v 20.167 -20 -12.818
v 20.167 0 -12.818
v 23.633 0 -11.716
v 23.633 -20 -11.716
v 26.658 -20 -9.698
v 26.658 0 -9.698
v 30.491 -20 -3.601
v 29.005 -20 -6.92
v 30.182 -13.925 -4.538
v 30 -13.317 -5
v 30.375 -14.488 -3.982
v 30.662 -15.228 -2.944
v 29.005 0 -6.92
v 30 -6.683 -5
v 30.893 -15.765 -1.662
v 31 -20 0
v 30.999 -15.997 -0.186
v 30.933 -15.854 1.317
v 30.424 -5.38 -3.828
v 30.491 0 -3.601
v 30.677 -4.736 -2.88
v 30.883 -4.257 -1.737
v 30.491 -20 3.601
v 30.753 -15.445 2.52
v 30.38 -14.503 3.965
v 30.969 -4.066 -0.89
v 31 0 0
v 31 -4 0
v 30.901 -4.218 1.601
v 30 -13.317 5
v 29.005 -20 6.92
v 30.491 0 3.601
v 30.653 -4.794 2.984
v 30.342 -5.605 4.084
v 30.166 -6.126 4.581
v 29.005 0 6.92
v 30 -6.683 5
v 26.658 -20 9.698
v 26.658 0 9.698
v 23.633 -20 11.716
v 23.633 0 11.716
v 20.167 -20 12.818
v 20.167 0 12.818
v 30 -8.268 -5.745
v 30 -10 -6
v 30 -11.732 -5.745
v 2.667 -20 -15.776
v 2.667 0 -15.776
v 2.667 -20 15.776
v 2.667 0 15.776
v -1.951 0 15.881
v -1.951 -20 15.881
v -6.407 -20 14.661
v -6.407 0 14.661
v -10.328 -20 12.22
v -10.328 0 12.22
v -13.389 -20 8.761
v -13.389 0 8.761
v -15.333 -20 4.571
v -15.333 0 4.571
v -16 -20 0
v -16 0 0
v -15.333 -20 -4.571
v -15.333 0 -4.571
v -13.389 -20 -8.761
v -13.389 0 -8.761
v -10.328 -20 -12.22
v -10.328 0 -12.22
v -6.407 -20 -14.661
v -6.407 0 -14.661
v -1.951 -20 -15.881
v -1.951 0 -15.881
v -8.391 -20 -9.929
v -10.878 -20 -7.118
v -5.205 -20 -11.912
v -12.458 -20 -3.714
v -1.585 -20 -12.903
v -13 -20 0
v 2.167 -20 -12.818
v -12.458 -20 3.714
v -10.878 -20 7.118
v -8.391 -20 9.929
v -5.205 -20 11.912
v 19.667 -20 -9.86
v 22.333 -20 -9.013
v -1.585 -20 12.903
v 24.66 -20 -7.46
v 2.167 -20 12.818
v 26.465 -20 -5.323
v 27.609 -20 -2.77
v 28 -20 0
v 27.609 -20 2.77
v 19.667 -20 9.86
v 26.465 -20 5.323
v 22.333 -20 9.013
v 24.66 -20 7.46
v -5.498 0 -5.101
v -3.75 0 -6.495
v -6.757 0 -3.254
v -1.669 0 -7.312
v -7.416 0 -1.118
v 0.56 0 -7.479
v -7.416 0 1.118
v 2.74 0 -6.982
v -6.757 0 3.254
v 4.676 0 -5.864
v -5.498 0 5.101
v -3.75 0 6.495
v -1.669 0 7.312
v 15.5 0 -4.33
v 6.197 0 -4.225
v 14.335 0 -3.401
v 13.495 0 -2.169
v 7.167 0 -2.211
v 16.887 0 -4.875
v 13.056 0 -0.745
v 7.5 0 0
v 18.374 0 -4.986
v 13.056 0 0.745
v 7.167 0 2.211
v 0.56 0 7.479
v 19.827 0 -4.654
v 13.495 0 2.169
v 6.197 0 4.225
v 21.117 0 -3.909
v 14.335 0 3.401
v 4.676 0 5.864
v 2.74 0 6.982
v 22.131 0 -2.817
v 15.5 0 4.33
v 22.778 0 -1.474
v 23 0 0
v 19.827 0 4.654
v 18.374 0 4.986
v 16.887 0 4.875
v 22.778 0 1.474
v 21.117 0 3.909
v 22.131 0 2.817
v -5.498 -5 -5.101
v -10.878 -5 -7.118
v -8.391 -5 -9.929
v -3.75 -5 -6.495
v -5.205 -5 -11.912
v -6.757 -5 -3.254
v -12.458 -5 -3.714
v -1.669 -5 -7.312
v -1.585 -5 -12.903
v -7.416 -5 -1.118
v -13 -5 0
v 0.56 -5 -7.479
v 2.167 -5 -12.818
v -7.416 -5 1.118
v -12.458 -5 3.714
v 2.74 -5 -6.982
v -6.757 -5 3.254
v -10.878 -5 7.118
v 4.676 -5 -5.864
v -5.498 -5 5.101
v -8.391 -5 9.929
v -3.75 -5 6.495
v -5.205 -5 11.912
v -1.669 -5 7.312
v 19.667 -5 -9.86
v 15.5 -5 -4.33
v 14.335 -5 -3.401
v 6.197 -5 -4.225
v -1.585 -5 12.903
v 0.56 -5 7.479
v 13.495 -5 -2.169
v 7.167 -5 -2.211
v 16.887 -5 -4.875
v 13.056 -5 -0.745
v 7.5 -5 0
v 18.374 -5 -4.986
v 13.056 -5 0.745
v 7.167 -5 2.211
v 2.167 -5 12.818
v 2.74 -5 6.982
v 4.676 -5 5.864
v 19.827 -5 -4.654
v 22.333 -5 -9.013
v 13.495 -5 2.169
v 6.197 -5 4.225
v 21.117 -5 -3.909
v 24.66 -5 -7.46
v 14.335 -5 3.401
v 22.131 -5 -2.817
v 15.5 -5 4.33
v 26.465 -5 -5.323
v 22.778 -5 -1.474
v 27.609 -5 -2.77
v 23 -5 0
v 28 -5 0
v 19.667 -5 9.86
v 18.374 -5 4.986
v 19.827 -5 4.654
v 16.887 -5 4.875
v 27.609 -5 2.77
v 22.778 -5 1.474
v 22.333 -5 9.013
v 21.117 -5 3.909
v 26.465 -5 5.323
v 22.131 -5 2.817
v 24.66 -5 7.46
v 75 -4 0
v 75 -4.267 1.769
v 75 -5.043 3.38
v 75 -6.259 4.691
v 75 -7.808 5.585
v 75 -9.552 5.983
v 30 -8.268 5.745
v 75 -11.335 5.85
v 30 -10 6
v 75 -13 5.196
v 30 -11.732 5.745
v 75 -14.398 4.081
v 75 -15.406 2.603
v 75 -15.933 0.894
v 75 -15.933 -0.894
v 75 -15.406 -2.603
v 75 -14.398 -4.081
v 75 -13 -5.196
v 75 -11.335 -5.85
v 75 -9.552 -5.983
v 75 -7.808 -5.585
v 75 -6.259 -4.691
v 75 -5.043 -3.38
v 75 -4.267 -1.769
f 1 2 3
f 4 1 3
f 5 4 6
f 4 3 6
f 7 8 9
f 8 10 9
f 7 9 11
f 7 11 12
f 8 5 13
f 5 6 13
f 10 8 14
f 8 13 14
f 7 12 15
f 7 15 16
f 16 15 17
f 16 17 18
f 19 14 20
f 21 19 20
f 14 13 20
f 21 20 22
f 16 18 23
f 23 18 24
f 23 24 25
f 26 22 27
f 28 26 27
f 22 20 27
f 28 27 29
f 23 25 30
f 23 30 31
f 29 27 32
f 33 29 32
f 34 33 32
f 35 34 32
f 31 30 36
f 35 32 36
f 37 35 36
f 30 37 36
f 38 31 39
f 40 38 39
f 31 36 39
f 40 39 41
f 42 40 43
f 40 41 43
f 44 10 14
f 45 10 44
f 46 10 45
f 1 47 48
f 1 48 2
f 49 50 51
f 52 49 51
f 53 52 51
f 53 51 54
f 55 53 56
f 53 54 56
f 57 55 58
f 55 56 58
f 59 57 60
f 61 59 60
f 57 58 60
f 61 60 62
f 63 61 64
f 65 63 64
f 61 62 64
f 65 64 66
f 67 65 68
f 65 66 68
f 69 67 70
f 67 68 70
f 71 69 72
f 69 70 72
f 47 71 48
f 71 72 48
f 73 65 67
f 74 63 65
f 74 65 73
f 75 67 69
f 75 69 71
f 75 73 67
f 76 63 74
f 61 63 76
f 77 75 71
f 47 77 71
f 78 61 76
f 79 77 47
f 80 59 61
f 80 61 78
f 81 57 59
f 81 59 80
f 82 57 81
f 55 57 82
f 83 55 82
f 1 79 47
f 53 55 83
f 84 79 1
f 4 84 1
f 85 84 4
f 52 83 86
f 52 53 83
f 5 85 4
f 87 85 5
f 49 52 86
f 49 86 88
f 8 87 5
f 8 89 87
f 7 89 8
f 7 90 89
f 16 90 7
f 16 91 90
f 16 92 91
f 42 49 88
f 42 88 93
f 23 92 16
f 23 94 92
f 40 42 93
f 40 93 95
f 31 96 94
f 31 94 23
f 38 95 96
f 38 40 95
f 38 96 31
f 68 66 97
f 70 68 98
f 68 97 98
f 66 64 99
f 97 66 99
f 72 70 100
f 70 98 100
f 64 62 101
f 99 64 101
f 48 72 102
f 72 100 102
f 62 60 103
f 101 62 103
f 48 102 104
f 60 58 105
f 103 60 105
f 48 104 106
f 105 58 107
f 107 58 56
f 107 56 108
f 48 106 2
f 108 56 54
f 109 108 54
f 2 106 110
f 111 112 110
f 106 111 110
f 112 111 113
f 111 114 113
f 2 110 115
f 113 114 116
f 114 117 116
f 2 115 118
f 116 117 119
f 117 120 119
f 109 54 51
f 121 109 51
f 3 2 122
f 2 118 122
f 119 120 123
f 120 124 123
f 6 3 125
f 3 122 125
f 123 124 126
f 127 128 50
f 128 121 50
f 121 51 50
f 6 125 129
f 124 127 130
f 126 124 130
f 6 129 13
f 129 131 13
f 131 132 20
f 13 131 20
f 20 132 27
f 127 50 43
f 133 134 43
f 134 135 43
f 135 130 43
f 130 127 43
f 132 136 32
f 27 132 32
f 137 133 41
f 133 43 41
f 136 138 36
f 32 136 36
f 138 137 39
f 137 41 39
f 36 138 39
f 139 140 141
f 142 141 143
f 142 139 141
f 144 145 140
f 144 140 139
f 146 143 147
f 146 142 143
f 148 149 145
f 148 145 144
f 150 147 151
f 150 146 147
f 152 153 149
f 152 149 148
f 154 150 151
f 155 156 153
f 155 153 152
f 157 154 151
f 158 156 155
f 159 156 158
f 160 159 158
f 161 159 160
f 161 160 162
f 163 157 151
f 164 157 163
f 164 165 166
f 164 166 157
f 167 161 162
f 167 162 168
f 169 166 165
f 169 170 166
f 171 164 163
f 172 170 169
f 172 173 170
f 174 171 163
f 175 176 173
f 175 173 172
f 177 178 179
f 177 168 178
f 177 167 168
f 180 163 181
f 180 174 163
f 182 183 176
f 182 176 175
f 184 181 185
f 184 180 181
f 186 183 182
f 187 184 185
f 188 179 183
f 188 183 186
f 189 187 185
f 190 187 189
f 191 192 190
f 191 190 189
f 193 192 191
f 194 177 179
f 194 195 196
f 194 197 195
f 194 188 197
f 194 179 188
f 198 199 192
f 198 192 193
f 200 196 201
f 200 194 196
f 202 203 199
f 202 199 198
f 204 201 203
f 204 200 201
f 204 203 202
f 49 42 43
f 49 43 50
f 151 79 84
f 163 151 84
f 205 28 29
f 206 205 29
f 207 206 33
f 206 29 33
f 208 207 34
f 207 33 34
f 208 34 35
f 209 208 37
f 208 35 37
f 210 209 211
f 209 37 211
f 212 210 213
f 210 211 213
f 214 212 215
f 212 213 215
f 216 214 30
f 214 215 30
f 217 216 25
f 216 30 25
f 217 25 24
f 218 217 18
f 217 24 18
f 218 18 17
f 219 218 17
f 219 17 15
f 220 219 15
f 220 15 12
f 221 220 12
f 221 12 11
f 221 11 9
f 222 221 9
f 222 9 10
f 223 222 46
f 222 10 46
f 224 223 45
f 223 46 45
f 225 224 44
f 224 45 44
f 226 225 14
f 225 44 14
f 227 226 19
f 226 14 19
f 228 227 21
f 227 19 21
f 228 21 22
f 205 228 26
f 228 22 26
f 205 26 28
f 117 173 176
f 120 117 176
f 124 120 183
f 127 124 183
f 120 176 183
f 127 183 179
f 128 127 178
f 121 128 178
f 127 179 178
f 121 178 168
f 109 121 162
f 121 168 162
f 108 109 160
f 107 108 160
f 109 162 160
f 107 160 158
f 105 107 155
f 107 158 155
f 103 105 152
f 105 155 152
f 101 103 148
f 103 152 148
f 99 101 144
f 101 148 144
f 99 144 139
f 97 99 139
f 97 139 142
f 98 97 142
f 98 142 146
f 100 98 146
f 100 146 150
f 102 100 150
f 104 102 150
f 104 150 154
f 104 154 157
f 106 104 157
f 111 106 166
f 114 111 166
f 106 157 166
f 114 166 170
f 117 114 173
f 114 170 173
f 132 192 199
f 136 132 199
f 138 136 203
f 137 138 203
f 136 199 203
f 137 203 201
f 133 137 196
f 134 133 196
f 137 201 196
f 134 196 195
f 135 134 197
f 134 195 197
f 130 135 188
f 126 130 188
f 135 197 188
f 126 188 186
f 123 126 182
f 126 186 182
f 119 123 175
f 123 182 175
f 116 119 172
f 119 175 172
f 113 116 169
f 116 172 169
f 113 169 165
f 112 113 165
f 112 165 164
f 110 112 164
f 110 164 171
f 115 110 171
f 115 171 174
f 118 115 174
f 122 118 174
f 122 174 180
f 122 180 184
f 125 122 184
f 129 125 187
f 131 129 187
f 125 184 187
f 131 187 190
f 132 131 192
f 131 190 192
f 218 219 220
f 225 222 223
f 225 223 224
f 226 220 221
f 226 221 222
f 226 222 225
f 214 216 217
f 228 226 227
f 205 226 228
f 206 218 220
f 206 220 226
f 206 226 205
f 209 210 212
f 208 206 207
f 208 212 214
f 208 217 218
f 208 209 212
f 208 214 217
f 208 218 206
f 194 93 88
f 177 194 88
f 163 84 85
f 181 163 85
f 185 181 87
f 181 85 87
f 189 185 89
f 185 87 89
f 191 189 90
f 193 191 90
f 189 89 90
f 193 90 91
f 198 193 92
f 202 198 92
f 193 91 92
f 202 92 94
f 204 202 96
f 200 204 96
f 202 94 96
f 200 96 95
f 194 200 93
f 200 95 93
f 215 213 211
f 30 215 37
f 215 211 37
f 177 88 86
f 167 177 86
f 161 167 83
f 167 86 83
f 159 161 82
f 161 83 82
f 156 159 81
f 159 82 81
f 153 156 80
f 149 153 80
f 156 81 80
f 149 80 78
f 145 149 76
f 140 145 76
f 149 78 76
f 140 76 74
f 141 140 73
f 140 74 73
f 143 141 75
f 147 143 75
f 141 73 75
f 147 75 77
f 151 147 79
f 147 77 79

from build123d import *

# Parameters (mm, degrees)
F1_DEPTH = 20
F3_DEPTH = 15
F4_R     = 5
F4_R_2   = 7.5
F5_DEPTH = 5
F7_R     = 6
F8_DEPTH = 45


with BuildPart() as f1:
    # F0 (on Front) → F1 (new body)
    with BuildSketch(Plane.XZ):
        with BuildLine():
            ThreePointArc((2.666667, 15.776213), (-16, 0), (2.666667, -15.776213))
            Line((2.666667, -15.776213), (20.166667, -12.818173))
            ThreePointArc((20.166667, -12.818173), (31, 0), (20.166667, 12.818173))
            Line((20.166667, 12.818173), (2.666667, 15.776213))
        make_face()
    extrude(amount=F1_DEPTH)

    # F2 (on face) → F3 (cut)
    with BuildSketch(Plane.XZ.offset(20)):
        with BuildLine():
            Line((19.666667, 9.860133), (2.166667, 12.818173))
            ThreePointArc((2.166667, 12.818173), (-13, 0), (2.166667, -12.818173))
            Line((2.166667, -12.818173), (19.666667, -9.860133))
            ThreePointArc((19.666667, -9.860133), (28, 0), (19.666667, 9.860133))
        make_face()
    extrude(amount=-F3_DEPTH, mode=Mode.SUBTRACT)

    # F4 (on face) → F5 (cut)
    with BuildSketch(Plane.XZ.offset(5)):
        with Locations((18, 0)):
            Circle(F4_R)
        Circle(F4_R_2)
    extrude(amount=-F5_DEPTH, mode=Mode.SUBTRACT)

    # F7 (on offset) → F8 (join)
    with BuildSketch(Plane.YZ.offset(30)):
        with Locations((-10, 0)):
            Circle(F7_R)
    extrude(amount=F8_DEPTH)


solid = f1.part
